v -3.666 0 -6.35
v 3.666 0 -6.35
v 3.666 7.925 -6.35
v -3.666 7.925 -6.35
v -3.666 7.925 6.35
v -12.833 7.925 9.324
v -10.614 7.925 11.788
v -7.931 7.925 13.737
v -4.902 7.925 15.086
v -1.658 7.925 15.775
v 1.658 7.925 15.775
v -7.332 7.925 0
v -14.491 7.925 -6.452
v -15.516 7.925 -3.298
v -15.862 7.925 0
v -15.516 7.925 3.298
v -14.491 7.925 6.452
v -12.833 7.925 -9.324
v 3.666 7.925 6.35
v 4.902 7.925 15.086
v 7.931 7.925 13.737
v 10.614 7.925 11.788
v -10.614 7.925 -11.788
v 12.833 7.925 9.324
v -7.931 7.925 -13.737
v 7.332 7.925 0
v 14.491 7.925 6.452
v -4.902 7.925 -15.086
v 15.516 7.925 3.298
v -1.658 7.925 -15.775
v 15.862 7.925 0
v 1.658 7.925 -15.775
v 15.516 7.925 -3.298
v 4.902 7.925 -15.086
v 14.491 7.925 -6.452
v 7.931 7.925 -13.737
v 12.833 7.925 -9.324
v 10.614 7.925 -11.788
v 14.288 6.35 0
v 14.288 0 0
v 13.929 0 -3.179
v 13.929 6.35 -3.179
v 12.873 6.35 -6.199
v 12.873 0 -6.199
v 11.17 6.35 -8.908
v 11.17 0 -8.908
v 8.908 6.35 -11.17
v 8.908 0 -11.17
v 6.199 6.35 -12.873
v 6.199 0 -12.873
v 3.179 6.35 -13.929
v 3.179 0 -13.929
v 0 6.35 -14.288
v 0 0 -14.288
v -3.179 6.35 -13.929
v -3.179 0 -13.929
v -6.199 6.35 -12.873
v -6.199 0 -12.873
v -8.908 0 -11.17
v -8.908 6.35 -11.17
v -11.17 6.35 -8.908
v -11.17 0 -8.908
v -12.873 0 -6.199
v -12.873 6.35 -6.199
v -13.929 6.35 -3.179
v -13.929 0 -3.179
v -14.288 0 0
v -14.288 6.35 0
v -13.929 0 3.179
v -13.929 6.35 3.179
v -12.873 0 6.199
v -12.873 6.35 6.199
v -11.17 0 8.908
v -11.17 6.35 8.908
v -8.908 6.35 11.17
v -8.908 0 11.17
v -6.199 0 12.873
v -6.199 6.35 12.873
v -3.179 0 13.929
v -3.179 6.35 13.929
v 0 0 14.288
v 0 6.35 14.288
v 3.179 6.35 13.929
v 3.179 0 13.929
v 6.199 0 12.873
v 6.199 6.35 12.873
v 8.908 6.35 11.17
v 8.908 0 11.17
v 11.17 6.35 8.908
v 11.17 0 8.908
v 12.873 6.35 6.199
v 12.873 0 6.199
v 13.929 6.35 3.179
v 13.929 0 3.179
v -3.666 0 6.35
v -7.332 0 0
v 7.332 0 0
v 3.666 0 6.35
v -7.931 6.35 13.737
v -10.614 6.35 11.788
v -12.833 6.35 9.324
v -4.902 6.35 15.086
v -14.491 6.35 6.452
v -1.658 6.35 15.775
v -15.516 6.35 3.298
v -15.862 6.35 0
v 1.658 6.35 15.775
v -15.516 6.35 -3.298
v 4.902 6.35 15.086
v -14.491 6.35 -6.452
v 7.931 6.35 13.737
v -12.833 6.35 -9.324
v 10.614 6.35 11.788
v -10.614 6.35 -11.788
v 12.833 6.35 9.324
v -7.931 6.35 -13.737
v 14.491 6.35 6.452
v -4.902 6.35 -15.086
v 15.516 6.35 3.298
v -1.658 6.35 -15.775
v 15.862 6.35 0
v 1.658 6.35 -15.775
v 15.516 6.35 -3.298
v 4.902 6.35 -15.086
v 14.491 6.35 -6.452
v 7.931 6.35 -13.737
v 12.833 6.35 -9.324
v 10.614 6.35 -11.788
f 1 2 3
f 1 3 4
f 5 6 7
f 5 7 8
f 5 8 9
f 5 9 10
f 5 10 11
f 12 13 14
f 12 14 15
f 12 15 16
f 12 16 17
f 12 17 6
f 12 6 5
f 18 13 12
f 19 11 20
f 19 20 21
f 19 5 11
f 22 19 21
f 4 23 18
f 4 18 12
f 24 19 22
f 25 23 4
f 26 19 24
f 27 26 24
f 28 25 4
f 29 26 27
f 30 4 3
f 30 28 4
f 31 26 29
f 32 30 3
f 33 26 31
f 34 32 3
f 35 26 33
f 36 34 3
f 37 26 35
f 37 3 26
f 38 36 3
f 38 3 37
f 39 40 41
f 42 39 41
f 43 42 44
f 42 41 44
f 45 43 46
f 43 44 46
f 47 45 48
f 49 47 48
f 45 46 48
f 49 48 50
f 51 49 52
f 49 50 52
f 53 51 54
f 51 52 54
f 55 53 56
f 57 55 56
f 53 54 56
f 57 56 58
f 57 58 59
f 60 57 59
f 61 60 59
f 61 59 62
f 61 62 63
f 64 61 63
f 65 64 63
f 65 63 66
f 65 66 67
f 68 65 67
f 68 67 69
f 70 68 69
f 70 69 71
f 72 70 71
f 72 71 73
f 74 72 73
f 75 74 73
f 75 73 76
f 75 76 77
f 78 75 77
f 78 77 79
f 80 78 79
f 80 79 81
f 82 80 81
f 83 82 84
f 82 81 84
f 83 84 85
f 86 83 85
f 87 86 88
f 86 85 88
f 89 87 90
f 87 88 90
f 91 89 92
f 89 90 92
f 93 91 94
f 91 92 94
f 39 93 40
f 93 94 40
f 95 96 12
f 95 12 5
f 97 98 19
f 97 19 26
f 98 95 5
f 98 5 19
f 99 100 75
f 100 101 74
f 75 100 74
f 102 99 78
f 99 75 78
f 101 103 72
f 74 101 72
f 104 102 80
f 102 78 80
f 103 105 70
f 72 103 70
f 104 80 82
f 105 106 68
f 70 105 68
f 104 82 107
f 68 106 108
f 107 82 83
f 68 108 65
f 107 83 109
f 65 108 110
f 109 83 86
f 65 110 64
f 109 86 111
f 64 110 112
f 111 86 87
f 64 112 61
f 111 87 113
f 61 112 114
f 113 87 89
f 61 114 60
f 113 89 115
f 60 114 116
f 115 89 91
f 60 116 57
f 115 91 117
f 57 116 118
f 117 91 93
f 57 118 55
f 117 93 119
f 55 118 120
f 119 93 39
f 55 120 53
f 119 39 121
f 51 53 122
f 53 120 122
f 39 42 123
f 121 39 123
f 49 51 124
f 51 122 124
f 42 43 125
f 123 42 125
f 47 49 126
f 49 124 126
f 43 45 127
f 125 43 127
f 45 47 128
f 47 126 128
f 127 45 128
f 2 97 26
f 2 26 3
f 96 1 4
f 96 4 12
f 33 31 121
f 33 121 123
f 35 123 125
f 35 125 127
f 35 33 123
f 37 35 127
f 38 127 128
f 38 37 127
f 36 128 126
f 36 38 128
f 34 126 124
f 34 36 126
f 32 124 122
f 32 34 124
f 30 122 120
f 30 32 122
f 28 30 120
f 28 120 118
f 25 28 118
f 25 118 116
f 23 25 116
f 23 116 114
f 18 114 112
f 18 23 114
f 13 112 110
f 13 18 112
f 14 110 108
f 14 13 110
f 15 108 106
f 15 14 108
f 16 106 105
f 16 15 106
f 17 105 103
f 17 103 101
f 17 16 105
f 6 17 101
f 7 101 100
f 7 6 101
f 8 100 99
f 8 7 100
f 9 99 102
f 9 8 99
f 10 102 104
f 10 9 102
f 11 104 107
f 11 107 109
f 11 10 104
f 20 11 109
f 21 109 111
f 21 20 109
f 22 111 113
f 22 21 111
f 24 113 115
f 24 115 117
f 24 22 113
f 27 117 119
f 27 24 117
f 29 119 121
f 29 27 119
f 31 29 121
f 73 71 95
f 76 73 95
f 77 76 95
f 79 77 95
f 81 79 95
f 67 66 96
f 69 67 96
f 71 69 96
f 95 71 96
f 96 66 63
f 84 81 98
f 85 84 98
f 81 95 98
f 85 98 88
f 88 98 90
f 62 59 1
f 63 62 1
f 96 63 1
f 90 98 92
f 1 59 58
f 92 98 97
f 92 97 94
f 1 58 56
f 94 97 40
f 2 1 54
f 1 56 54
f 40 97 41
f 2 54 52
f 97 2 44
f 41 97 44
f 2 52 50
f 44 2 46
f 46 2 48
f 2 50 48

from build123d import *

# Parameters (mm, degrees)
SKETCH1_R           = 14.2875
BOSS_EXTRUDE1_DEPTH = 7.9248
SKETCH2_R           = 15.8623
SKETCH2_R_2         = 14.2875
BOSS_EXTRUDE2_DEPTH = 1.5748


with BuildPart() as part:
    # Sketch1 → Boss-Extrude1 (new body)
    with BuildSketch(Plane(origin=(0, 0, 0), x_dir=(1, 0, 0), z_dir=(0, 1, 0))):
        Circle(SKETCH1_R)
        Polygon((-3.666174209, 6.35), (-7.332348419, 0), (-3.666174209, -6.35), (3.666174209, -6.35), (7.332348419, 0), (3.666174209, 6.35), align=None, mode=Mode.SUBTRACT)
    extrude(amount=BOSS_EXTRUDE1_DEPTH)

    # Sketch2 → Boss-Extrude2 (add)
    with BuildSketch(Plane(origin=(0, 7.9248, 0), x_dir=(1, 0, 0), z_dir=(0, 1, 0))):
        Circle(SKETCH2_R)
        Circle(SKETCH2_R_2, mode=Mode.SUBTRACT)
    extrude(amount=-BOSS_EXTRUDE2_DEPTH)


solid = part.part
